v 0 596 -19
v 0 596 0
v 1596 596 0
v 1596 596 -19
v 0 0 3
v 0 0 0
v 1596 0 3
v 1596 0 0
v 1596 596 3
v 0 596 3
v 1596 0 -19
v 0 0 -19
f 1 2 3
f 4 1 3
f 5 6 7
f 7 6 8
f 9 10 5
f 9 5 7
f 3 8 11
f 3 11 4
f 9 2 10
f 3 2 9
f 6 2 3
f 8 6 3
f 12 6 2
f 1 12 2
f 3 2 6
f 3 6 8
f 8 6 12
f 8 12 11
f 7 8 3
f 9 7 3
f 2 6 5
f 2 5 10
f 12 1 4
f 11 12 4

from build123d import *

# Parameters (mm, degrees)
F0_W     = 1596
F0_H     = 596
F1_DEPTH = 19
F2_DEPTH = 3


with BuildPart() as f1:
    # F0 (on Top) → F1 (new body)
    with BuildSketch(Plane.XY):
        with Locations((798, 298)):
            Rectangle(F0_W, F0_H)
    extrude(amount=-F1_DEPTH)


with BuildPart() as f2:
    # F0 (on Top) → F2 (new body)
    with BuildSketch(Plane.XY):
        with Locations((798, 298)):
            Rectangle(F0_W, F0_H)
    extrude(amount=F2_DEPTH)


solid = Compound([f1.part, f2.part])
